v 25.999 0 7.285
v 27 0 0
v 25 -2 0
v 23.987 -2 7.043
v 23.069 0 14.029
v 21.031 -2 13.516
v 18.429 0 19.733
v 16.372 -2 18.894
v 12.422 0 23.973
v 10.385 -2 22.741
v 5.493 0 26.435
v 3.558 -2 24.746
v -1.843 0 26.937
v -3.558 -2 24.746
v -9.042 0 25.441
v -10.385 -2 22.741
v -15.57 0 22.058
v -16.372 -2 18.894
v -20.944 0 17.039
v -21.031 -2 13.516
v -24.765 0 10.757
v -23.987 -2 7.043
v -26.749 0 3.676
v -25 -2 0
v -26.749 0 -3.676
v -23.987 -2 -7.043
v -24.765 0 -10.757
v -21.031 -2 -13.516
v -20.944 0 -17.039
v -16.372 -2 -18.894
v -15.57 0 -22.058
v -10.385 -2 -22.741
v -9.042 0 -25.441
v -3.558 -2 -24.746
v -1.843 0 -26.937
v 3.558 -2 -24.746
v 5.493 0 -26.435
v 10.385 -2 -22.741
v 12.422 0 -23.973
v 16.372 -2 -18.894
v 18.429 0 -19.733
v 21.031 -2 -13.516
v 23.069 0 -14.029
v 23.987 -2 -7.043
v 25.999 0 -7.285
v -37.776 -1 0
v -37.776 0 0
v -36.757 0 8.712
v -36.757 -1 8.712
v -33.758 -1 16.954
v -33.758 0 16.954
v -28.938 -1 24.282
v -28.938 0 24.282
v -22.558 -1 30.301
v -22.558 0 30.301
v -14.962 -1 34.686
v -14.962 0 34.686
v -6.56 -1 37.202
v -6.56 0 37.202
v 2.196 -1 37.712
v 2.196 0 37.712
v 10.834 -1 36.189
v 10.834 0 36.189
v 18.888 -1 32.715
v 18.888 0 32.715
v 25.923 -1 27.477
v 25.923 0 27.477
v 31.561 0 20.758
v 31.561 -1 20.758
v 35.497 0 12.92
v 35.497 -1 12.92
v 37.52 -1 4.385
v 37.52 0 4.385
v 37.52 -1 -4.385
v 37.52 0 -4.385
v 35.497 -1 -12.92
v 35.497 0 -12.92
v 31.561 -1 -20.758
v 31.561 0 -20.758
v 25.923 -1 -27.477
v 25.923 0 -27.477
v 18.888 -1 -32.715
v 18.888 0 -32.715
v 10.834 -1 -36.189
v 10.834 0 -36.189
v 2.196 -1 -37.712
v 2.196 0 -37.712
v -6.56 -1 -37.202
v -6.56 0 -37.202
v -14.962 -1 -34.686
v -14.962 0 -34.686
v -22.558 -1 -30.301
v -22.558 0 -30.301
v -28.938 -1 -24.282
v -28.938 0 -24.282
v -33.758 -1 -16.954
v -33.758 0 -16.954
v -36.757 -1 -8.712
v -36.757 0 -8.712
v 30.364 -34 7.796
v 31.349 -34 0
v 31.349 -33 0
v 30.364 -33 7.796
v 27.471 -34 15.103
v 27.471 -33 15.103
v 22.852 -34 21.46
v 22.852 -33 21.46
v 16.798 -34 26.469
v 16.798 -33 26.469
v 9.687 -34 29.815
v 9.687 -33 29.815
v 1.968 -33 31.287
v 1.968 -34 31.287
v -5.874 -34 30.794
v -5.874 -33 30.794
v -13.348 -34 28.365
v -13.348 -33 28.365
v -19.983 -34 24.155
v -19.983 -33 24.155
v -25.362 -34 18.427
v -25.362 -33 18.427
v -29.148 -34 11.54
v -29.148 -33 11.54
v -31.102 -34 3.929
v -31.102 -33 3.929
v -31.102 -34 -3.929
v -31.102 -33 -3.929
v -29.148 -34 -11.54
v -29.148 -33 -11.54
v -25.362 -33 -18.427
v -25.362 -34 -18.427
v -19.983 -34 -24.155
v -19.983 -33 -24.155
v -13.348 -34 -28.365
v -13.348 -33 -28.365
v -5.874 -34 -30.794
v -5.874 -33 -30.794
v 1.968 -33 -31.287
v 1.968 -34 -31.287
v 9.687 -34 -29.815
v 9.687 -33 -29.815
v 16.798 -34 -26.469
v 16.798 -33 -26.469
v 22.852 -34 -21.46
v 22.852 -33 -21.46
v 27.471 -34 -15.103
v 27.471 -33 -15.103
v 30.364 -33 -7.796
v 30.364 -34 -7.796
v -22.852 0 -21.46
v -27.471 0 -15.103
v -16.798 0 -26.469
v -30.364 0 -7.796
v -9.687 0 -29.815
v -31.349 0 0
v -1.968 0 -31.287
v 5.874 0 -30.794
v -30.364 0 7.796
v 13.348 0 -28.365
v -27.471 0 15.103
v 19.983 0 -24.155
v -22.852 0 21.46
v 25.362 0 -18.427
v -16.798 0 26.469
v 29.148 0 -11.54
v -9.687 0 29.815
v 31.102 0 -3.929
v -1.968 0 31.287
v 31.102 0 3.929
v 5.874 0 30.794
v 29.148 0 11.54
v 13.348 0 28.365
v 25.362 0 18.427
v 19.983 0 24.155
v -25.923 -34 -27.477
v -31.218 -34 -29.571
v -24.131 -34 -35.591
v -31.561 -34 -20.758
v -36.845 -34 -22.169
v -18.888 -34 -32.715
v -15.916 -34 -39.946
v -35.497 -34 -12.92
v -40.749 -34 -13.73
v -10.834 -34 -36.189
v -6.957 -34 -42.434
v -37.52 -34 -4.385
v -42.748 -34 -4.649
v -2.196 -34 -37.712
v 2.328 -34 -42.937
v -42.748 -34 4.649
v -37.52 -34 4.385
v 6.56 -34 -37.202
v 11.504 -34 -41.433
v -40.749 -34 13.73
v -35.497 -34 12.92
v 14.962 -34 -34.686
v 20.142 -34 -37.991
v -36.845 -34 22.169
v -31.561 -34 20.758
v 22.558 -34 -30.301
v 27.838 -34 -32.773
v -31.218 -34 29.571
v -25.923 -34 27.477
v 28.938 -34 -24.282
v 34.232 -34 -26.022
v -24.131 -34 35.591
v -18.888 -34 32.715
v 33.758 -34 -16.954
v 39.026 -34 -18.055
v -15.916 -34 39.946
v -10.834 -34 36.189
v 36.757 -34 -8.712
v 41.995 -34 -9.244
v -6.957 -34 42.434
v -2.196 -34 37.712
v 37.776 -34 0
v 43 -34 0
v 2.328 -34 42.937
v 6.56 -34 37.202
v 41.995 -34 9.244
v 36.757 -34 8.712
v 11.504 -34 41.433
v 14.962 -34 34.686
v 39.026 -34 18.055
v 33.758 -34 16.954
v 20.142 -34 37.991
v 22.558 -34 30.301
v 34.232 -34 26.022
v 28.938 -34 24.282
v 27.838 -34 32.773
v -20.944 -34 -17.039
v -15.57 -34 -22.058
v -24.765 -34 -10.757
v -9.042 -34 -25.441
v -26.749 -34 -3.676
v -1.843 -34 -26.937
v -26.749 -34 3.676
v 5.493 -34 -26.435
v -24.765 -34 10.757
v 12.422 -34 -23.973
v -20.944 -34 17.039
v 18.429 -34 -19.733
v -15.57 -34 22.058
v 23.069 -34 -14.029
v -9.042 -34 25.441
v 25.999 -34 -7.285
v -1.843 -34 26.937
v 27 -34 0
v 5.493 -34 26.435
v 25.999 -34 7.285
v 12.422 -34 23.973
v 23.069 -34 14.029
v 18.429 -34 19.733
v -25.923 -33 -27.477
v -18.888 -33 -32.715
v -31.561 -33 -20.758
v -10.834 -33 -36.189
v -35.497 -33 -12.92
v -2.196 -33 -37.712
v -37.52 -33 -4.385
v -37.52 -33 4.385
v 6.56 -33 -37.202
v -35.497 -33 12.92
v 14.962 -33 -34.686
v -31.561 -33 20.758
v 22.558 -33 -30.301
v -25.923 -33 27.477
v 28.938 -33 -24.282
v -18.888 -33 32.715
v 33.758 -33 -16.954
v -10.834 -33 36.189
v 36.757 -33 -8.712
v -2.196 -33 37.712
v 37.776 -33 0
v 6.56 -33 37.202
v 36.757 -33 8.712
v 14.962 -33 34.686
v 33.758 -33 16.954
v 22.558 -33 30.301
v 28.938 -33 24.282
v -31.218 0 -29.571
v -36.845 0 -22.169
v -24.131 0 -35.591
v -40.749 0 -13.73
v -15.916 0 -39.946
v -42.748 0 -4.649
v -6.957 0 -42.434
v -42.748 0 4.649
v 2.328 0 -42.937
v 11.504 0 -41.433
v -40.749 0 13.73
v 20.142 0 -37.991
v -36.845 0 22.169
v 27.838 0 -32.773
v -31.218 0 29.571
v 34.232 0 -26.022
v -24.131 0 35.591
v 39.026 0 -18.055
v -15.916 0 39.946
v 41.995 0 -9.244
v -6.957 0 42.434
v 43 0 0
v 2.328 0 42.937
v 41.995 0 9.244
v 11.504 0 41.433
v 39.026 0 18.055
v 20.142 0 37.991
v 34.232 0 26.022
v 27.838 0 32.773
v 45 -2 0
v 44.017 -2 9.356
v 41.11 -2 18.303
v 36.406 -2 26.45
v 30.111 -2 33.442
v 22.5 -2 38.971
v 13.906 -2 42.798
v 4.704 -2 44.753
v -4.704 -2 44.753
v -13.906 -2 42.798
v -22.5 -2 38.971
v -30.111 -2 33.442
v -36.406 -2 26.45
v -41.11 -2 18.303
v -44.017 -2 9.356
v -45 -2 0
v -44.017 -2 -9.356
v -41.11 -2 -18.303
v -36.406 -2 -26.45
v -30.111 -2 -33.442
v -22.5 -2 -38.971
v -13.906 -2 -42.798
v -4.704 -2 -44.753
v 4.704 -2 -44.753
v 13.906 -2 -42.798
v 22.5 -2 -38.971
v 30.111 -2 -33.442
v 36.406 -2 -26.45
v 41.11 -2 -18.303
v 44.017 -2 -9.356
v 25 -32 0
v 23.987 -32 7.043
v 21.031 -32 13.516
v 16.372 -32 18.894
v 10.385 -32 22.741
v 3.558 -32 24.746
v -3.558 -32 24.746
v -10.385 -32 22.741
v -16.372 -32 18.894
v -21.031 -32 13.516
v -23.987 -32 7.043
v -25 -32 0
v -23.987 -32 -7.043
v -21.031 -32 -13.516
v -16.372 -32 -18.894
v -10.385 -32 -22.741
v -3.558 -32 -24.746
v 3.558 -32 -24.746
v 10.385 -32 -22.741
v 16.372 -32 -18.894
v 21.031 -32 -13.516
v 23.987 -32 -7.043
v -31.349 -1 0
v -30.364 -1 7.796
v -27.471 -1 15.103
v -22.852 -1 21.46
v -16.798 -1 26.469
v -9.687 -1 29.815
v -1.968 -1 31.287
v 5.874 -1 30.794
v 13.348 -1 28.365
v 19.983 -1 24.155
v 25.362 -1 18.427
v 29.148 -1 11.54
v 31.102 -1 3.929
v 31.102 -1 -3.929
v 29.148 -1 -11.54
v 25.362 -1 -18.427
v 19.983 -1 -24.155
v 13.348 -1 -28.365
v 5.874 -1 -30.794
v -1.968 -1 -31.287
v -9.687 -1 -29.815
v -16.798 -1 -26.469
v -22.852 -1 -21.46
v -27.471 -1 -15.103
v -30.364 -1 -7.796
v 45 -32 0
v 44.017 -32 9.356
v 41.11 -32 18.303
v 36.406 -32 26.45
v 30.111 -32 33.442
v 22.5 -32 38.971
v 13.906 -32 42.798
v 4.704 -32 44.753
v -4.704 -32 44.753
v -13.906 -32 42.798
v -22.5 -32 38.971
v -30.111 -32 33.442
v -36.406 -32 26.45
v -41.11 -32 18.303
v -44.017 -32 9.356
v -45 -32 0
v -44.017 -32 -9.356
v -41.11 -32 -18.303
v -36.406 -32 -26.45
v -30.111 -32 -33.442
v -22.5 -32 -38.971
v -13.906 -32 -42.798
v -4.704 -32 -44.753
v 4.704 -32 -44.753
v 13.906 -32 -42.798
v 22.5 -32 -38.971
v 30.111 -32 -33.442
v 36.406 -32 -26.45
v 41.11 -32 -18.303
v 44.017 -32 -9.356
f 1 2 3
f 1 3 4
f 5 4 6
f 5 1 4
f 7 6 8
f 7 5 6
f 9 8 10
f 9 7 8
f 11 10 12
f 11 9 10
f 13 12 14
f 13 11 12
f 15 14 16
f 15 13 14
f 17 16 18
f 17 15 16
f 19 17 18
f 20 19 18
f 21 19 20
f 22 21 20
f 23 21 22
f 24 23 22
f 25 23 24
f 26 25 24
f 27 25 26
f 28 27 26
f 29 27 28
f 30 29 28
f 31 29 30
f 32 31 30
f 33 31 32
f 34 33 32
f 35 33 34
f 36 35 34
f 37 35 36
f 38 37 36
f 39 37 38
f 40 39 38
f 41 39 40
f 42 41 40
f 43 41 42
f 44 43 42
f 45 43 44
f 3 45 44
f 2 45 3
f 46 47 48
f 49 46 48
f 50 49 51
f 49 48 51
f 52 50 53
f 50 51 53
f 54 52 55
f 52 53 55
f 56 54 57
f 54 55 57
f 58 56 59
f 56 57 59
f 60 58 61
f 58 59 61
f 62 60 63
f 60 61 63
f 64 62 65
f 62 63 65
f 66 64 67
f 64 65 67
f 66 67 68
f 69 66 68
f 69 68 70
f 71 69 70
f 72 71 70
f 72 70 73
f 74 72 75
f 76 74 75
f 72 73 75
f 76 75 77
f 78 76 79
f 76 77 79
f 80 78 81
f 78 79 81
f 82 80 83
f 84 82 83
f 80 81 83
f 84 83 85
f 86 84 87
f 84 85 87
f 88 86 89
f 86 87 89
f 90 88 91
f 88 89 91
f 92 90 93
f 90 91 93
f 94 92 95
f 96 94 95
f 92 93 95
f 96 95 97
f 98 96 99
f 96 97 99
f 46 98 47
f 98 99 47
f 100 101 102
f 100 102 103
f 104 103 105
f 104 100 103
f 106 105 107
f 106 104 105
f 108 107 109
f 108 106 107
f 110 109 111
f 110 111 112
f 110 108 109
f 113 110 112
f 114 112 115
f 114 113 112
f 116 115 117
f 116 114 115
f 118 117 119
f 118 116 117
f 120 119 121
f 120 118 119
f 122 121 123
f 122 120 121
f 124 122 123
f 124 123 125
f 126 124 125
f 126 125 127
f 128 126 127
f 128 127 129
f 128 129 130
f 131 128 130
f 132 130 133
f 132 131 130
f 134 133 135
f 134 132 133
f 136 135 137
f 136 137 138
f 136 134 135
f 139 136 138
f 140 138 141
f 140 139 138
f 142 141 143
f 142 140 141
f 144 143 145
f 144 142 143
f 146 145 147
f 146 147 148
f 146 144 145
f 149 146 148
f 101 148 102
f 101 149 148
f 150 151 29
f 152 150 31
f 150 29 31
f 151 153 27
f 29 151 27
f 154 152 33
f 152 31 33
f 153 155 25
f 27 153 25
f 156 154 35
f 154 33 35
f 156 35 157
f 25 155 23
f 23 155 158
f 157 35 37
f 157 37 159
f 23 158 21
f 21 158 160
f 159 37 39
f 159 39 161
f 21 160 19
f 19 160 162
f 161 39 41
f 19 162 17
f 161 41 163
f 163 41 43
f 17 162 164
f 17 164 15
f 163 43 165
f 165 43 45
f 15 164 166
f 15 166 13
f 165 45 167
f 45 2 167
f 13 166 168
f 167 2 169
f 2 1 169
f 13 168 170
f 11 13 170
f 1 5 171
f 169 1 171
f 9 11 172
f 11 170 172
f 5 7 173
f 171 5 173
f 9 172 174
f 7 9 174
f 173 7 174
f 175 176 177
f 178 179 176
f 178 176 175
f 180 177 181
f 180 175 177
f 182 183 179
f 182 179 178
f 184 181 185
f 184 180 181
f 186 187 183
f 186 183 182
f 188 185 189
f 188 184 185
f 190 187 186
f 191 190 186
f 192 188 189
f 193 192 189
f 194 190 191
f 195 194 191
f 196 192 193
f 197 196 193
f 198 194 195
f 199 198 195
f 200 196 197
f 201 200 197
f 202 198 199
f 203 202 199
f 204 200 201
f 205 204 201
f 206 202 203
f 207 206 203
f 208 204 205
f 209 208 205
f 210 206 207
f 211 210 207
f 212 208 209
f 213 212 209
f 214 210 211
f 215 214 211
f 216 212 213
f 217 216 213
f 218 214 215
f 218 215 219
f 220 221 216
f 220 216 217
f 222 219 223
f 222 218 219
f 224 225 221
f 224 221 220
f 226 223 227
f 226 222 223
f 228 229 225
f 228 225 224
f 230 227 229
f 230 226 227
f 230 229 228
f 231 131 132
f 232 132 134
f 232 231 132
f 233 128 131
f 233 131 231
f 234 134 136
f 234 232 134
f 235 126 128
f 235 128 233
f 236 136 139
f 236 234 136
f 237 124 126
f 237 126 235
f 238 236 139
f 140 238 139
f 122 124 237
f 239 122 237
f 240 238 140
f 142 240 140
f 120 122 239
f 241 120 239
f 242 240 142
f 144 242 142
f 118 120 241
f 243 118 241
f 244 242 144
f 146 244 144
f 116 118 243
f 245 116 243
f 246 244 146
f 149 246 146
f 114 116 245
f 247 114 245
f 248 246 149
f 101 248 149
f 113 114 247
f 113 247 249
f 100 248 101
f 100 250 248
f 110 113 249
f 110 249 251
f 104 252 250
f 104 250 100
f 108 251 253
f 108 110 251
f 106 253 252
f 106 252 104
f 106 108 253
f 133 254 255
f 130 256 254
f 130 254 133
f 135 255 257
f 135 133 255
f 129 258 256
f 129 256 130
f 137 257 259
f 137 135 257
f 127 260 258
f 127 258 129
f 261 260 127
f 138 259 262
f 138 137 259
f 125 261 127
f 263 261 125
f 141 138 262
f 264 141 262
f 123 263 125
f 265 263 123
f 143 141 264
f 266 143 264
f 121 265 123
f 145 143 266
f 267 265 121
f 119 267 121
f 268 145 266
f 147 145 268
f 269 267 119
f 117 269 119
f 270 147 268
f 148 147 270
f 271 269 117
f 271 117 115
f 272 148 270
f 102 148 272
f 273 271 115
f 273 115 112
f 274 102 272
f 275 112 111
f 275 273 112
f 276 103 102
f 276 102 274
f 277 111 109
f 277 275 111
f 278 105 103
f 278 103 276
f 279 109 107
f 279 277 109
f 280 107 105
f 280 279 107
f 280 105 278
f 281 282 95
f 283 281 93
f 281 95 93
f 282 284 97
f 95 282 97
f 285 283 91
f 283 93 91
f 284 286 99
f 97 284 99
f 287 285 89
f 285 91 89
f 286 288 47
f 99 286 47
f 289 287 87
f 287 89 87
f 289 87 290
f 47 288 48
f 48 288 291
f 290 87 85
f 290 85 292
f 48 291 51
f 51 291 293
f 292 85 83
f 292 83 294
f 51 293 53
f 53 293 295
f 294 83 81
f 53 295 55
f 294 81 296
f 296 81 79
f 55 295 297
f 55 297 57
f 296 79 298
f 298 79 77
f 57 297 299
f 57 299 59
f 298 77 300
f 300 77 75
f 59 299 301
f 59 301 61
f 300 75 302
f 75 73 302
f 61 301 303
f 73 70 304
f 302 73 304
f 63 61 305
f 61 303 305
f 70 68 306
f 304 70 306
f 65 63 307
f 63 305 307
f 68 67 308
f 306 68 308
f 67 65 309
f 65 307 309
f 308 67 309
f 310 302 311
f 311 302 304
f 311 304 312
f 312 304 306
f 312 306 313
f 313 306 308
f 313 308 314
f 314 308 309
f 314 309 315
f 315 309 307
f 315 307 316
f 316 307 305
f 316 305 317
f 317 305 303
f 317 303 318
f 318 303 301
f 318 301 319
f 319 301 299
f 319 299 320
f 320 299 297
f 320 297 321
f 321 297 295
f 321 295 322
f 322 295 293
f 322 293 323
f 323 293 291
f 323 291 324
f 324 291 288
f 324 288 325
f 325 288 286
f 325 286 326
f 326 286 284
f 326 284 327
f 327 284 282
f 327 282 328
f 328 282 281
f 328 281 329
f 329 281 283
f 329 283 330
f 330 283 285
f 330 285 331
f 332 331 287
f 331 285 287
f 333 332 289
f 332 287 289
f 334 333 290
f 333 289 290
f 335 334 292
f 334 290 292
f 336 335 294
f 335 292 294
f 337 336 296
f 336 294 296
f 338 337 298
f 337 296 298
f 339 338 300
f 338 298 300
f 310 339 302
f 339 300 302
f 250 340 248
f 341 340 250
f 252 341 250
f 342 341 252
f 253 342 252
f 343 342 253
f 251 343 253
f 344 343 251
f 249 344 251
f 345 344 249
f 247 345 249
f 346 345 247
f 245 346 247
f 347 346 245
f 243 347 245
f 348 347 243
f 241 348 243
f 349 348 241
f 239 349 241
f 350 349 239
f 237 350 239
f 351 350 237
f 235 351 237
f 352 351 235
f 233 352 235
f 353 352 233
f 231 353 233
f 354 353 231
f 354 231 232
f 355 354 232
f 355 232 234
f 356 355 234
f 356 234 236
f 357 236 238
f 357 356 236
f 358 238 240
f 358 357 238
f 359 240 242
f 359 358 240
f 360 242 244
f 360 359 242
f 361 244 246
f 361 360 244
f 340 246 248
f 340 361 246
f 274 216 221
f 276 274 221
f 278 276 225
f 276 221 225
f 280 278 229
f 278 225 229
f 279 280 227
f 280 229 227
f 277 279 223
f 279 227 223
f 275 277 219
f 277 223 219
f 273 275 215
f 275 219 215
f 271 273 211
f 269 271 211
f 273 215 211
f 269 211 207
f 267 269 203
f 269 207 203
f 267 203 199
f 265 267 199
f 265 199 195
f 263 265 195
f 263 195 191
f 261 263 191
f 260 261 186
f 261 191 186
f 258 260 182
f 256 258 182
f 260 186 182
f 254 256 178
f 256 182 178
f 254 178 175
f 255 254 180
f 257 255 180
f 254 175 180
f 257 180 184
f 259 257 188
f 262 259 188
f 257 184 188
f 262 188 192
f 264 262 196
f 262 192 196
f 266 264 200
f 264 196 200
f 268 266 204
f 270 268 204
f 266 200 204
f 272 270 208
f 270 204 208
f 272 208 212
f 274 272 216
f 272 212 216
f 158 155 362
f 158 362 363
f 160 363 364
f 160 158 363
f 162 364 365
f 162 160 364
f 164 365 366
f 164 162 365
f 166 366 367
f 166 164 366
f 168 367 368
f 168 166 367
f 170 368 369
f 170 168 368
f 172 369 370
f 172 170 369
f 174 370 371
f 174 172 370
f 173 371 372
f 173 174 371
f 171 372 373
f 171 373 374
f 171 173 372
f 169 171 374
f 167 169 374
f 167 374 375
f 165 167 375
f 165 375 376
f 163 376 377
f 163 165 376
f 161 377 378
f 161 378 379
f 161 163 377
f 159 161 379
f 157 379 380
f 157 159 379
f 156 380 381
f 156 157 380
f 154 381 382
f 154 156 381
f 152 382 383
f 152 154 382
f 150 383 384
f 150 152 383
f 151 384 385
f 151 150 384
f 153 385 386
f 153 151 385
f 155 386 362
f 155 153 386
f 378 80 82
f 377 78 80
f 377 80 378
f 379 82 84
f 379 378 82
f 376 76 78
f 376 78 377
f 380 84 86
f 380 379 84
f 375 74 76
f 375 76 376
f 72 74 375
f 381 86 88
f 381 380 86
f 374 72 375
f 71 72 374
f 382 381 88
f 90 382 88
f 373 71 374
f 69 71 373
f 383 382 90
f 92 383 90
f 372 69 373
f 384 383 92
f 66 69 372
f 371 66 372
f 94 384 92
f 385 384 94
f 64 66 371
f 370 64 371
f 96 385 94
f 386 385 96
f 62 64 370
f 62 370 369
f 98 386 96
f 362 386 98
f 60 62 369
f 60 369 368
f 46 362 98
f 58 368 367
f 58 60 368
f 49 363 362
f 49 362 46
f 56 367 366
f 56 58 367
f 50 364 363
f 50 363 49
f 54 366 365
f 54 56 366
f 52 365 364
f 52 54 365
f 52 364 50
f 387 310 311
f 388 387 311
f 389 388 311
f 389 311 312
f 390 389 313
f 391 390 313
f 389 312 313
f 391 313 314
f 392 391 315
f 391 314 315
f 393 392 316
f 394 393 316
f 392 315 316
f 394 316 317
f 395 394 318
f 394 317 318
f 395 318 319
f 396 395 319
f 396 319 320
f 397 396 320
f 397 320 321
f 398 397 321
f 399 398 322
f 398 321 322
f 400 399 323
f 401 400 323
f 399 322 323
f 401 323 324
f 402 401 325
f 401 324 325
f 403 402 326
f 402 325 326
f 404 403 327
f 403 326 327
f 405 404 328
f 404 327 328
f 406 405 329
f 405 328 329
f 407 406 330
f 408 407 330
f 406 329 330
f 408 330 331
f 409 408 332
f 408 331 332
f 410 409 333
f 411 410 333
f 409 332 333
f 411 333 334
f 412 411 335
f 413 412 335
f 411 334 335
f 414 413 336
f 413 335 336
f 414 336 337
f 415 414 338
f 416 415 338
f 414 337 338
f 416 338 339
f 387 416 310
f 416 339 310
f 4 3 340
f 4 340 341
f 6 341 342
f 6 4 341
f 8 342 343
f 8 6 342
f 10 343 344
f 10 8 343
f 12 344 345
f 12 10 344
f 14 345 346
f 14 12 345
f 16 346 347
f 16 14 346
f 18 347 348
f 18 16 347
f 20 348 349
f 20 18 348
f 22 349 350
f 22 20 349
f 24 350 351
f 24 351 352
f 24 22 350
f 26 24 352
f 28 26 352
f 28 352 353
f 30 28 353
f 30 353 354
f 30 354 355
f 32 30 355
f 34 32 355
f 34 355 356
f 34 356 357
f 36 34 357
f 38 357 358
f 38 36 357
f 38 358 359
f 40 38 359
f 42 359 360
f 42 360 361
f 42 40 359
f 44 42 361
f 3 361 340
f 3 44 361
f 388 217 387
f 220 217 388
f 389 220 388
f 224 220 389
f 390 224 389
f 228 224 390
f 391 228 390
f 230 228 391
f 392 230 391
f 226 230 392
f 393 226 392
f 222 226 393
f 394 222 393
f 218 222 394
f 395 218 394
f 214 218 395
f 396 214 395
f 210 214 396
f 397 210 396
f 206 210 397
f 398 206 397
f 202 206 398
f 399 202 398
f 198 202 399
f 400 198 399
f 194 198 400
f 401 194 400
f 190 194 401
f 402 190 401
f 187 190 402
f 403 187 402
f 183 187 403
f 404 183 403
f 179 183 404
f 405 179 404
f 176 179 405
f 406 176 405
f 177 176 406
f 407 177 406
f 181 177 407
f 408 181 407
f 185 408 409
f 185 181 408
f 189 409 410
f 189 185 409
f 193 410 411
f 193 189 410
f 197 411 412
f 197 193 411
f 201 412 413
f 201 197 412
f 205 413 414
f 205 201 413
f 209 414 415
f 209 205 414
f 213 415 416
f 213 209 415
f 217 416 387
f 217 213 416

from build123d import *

# Parameters (mm, degrees)
F0_R     = 45
F0_R_2   = 25
F1_DEPTH = 34
F2_SIZE  = 2
F3_SIZE  = 2
F4_SIZE  = 2
F5_R     = 37.775597
F5_R_2   = 31.34905
F6_DEPTH = 1
F7_R     = 37.775597
F7_R_2   = 31.34905
F8_DEPTH = 1


with BuildPart() as f1:
    # F0 (on Front) → F1 (new body)
    with BuildSketch(Plane.XZ):
        Circle(F0_R)
        Circle(F0_R_2, mode=Mode.SUBTRACT)
    extrude(amount=F1_DEPTH)

    # F2
    f2_edges = [f1.edges().sort_by_distance(p)[0] for p in [
        (-45, -34, 0),
        (-45, 0, 0),
    ]]
    chamfer(f2_edges, length=F2_SIZE)

    # F3
    f3_edges = [f1.edges().sort_by_distance(p)[0] for p in [
        (-25, -34, 0),
    ]]
    chamfer(f3_edges, length=F3_SIZE)

    # F4
    f4_edges = [f1.edges().sort_by_distance(p)[0] for p in [
        (-25, 0, 0),
    ]]
    chamfer(f4_edges, length=F4_SIZE)

    # F5 (on face) → F6 (cut)
    with BuildSketch(Plane(origin=(0, 0, 0), x_dir=(-1, 0, 0), z_dir=(0, 1, 0))):
        Circle(F5_R)
        Circle(F5_R_2, mode=Mode.SUBTRACT)
    extrude(amount=-F6_DEPTH, mode=Mode.SUBTRACT)

    # F7 (on face) → F8 (cut)
    with BuildSketch(Plane.XZ.offset(34)):
        Circle(F7_R)
        Circle(F7_R_2, mode=Mode.SUBTRACT)
    extrude(amount=-F8_DEPTH, mode=Mode.SUBTRACT)


solid = f1.part
